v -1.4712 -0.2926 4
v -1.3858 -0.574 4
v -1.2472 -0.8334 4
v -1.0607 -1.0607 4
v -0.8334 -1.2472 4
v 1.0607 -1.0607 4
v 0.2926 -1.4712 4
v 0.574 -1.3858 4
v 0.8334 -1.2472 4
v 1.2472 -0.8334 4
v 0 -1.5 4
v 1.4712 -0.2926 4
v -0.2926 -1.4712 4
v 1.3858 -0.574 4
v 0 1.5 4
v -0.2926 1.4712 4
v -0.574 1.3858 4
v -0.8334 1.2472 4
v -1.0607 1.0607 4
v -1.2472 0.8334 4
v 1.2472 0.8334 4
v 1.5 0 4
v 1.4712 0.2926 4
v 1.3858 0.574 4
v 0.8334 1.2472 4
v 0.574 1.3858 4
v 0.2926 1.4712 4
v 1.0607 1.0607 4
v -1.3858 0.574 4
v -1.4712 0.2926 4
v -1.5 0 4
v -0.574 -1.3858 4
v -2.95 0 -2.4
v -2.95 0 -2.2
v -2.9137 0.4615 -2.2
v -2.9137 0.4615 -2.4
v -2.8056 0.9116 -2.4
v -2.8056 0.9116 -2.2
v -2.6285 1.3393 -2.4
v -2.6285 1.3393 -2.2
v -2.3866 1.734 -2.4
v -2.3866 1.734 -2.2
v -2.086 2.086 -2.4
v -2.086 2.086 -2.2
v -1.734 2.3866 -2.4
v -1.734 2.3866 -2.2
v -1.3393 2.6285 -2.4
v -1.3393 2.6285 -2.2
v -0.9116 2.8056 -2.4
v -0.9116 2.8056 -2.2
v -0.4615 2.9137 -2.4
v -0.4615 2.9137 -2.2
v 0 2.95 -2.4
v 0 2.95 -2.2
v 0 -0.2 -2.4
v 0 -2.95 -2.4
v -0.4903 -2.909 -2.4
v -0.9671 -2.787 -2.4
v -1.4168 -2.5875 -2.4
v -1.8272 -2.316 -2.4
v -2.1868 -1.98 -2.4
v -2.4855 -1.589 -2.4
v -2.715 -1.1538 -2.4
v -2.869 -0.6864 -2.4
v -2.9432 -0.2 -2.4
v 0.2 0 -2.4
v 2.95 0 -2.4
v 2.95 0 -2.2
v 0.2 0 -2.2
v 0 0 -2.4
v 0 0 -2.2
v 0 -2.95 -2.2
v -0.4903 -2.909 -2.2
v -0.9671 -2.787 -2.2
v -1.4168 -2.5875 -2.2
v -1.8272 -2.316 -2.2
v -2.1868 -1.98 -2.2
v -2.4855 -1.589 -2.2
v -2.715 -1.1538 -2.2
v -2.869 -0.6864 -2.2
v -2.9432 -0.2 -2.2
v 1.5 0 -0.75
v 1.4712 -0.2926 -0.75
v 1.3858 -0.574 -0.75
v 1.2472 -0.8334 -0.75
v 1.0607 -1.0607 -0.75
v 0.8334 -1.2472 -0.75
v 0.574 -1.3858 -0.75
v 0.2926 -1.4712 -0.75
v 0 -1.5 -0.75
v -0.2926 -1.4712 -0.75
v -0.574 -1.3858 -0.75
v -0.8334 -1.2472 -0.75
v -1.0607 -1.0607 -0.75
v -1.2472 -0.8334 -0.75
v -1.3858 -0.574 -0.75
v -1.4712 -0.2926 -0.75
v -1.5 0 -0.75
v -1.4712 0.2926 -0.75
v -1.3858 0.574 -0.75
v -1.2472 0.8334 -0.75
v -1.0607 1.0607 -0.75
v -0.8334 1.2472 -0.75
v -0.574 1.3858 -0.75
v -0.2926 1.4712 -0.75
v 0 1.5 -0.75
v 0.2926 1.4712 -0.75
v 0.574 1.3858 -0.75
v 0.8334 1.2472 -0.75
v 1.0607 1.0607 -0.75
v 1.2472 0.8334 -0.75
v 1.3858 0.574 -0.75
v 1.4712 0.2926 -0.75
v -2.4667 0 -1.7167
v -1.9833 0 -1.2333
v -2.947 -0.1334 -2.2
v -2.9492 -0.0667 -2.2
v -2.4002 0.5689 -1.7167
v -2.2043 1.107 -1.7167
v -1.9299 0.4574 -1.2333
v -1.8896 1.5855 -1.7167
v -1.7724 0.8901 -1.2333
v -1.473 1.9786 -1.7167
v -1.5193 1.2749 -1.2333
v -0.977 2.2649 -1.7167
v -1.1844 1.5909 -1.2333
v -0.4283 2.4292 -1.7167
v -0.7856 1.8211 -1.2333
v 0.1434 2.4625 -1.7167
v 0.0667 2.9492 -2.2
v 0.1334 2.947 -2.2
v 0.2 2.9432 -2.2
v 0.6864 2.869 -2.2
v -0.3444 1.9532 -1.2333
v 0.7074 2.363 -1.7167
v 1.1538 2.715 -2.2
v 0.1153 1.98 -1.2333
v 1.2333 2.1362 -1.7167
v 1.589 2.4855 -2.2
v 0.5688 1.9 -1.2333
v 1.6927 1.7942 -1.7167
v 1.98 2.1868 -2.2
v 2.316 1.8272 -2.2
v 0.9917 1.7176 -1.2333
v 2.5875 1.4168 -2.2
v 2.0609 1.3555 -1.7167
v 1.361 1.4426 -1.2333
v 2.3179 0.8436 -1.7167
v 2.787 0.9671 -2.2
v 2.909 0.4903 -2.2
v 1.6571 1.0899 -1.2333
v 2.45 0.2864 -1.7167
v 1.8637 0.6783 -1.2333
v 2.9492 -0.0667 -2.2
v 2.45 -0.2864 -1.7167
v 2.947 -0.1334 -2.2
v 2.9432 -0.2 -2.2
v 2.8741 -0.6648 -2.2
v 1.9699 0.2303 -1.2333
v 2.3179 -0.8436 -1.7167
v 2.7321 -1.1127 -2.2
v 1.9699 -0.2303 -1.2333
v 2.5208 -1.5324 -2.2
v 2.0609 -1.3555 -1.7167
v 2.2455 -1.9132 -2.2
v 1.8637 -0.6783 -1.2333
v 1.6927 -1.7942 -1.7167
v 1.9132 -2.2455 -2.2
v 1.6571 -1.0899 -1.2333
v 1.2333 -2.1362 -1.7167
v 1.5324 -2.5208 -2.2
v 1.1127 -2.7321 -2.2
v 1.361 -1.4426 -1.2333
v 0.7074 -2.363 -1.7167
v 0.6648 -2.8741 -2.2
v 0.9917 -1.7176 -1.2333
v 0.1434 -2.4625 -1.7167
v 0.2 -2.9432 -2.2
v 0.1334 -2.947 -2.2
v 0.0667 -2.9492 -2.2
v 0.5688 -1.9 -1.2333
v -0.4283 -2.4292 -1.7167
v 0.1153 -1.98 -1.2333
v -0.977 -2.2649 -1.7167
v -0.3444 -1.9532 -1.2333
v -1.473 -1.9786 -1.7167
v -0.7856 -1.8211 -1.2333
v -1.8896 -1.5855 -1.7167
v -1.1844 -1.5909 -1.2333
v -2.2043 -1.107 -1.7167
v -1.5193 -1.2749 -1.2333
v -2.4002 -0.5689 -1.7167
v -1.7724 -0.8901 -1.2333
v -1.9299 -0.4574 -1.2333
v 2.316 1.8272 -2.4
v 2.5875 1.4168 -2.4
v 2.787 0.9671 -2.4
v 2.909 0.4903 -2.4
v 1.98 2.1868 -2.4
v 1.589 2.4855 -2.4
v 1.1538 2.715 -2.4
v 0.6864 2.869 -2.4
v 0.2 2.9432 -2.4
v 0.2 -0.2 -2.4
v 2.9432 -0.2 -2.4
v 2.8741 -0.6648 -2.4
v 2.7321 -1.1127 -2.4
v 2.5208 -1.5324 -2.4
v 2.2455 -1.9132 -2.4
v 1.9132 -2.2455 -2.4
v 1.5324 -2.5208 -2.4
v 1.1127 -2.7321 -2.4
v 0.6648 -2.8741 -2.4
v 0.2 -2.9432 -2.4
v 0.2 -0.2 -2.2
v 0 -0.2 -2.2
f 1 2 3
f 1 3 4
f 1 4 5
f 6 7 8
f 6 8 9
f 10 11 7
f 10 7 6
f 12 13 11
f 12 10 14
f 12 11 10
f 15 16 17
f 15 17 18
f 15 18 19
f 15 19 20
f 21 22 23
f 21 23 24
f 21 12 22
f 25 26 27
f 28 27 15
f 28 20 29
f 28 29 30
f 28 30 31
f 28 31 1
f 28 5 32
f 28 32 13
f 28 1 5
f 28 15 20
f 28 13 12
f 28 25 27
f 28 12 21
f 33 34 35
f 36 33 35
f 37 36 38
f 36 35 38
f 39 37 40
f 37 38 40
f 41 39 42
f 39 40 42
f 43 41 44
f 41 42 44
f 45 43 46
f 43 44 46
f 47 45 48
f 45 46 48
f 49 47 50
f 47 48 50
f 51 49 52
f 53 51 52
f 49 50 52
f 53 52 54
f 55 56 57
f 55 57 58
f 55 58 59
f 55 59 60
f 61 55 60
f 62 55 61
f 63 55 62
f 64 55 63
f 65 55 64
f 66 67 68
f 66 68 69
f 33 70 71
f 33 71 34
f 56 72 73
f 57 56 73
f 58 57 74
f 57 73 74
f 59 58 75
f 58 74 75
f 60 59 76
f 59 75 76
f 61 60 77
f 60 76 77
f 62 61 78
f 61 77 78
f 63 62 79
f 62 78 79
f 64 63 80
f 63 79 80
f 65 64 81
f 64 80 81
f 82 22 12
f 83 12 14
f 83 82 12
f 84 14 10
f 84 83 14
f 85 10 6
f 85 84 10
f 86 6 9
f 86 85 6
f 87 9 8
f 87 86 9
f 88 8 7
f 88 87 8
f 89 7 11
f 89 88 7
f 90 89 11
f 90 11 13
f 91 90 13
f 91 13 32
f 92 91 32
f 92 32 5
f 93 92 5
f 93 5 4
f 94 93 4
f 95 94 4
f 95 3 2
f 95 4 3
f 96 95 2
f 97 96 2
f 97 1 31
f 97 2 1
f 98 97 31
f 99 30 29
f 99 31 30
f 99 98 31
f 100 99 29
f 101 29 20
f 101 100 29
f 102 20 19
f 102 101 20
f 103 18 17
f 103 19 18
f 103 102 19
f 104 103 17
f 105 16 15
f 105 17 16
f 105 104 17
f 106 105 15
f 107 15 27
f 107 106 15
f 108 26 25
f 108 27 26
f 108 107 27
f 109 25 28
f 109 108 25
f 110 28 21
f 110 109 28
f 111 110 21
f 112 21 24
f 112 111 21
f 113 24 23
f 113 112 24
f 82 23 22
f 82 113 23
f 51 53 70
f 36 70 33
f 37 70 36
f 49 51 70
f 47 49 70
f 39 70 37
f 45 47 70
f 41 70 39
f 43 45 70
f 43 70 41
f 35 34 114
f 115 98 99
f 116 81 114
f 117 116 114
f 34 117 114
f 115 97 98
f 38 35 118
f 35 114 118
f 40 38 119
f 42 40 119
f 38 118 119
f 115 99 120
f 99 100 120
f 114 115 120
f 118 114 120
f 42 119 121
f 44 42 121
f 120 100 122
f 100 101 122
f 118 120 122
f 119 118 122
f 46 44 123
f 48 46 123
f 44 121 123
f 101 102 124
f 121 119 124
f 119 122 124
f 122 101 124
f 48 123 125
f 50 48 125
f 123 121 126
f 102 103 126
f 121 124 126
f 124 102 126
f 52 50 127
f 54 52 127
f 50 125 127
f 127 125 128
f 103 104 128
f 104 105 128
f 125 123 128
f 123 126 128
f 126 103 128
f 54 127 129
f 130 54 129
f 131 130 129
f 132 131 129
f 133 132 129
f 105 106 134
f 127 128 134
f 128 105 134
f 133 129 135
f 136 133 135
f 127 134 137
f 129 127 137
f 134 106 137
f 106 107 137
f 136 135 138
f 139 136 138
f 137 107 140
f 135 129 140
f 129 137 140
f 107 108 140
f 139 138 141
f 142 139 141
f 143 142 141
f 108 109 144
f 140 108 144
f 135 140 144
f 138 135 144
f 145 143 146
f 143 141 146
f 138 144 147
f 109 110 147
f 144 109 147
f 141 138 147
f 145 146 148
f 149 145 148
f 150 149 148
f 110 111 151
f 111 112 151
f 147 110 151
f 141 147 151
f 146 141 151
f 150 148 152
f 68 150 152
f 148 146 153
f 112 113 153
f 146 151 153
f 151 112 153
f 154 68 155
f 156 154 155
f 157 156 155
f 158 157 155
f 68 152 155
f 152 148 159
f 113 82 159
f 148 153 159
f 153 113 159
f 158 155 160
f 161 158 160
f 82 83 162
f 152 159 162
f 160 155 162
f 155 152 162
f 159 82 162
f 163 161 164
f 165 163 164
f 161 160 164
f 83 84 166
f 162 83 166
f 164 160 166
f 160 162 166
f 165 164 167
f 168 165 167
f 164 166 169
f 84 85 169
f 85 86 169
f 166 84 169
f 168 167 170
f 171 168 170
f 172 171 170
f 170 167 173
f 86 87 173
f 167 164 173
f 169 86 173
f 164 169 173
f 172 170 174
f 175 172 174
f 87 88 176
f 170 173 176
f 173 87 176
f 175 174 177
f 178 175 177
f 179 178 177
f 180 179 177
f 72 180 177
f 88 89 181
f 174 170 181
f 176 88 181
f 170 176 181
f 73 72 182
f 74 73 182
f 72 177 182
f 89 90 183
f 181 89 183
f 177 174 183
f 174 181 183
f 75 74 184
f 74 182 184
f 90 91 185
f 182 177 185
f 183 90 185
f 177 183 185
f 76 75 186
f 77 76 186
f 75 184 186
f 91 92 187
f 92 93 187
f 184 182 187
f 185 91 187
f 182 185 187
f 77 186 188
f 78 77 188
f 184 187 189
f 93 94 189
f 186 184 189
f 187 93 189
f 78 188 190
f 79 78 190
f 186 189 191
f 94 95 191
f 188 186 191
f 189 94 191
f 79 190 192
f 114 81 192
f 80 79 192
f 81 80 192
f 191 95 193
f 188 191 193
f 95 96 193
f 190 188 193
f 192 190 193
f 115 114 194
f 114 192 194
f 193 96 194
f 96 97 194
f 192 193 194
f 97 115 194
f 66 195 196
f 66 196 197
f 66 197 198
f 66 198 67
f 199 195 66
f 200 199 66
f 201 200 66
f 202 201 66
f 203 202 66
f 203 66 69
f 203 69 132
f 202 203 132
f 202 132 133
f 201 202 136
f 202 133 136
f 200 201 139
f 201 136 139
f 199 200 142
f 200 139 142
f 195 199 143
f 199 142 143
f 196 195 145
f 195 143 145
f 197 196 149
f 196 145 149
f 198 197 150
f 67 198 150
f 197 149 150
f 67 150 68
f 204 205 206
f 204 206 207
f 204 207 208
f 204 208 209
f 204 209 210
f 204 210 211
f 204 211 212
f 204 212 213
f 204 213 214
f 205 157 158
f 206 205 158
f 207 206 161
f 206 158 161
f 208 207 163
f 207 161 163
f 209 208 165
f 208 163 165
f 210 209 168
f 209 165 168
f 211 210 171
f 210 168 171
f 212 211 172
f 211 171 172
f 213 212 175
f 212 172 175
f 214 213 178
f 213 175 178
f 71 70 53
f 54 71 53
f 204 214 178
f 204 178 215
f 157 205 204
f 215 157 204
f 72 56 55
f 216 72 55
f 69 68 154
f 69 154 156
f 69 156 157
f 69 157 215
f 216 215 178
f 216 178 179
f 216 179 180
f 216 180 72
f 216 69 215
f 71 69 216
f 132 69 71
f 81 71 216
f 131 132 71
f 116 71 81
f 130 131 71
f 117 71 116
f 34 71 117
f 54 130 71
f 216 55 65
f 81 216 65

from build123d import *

# Parameters (mm, degrees)
ESQUISSE1_R                     = 1.5
BOSS_EXTRU_1_DEPTH              = 4
ESQUISSE2_R                     = 2.95
BOSS_EXTRU_2_DEPTH              = 2.4
CHANFREIN1_SIZE                 = 2.2
ESQUISSE4_W                     = 0.2
ESQUISSE4_H                     = 5.9
ESQUISSE4_W_2                   = 5.9
ESQUISSE4_H_2                   = 0.2
ENL_V_DE_MAT_EXTRU_MINCE1_DEPTH = 0.2


with BuildPart() as part:
    # Esquisse1 → Boss.-Extru.1 (new body)
    with BuildSketch(Plane.XY):
        Circle(ESQUISSE1_R)
    extrude(amount=BOSS_EXTRU_1_DEPTH)

    # Esquisse2 → Boss.-Extru.2 (add)
    with BuildSketch(Plane(origin=(0, 0, 0), x_dir=(-1, 0, 0), z_dir=(0, 0, -1))):
        Circle(ESQUISSE2_R)
    extrude(amount=BOSS_EXTRU_2_DEPTH)

    # Chanfrein1
    # the kernel refuses this chamfer: 2.2 mm, written as the material it takes off along each edge
    with BuildSketch(Plane(origin=(0, 0, 0), x_dir=(-1, 0, 0), z_dir=(0, -1, 0))) as chanfrein1_piece_1_section:
        Polygon((2.95, CHANFREIN1_SIZE), (2.95 - CHANFREIN1_SIZE, 0), (2.95, 0), align=None)
    chanfrein1_piece_1 = revolve(axis=Axis((0, 0, 0), (0, 0, -1)), mode=Mode.PRIVATE)
    chanfrein1_piece_1 = chanfrein1_piece_1 - Plane(origin=(0, 0, -1.483070645), x_dir=(1, 0, 0), z_dir=(0, 0, -1)) * Cylinder(1.5, 12, mode=Mode.PRIVATE)
    add(chanfrein1_piece_1, mode=Mode.SUBTRACT)

    # Esquisse4 → Enlèv. de mat.-Extru.-Mince1 (cut)
    with BuildSketch(Plane(origin=(0, 0, -2.4), x_dir=(-1, 0, 0), z_dir=(0, 0, -1))):
        with Locations((-0.1, 0)):
            Rectangle(ESQUISSE4_W, ESQUISSE4_H)
        with Locations((0, -0.1)):
            Rectangle(ESQUISSE4_W_2, ESQUISSE4_H_2)
    extrude(amount=-ENL_V_DE_MAT_EXTRU_MINCE1_DEPTH, mode=Mode.SUBTRACT)


solid = part.part
